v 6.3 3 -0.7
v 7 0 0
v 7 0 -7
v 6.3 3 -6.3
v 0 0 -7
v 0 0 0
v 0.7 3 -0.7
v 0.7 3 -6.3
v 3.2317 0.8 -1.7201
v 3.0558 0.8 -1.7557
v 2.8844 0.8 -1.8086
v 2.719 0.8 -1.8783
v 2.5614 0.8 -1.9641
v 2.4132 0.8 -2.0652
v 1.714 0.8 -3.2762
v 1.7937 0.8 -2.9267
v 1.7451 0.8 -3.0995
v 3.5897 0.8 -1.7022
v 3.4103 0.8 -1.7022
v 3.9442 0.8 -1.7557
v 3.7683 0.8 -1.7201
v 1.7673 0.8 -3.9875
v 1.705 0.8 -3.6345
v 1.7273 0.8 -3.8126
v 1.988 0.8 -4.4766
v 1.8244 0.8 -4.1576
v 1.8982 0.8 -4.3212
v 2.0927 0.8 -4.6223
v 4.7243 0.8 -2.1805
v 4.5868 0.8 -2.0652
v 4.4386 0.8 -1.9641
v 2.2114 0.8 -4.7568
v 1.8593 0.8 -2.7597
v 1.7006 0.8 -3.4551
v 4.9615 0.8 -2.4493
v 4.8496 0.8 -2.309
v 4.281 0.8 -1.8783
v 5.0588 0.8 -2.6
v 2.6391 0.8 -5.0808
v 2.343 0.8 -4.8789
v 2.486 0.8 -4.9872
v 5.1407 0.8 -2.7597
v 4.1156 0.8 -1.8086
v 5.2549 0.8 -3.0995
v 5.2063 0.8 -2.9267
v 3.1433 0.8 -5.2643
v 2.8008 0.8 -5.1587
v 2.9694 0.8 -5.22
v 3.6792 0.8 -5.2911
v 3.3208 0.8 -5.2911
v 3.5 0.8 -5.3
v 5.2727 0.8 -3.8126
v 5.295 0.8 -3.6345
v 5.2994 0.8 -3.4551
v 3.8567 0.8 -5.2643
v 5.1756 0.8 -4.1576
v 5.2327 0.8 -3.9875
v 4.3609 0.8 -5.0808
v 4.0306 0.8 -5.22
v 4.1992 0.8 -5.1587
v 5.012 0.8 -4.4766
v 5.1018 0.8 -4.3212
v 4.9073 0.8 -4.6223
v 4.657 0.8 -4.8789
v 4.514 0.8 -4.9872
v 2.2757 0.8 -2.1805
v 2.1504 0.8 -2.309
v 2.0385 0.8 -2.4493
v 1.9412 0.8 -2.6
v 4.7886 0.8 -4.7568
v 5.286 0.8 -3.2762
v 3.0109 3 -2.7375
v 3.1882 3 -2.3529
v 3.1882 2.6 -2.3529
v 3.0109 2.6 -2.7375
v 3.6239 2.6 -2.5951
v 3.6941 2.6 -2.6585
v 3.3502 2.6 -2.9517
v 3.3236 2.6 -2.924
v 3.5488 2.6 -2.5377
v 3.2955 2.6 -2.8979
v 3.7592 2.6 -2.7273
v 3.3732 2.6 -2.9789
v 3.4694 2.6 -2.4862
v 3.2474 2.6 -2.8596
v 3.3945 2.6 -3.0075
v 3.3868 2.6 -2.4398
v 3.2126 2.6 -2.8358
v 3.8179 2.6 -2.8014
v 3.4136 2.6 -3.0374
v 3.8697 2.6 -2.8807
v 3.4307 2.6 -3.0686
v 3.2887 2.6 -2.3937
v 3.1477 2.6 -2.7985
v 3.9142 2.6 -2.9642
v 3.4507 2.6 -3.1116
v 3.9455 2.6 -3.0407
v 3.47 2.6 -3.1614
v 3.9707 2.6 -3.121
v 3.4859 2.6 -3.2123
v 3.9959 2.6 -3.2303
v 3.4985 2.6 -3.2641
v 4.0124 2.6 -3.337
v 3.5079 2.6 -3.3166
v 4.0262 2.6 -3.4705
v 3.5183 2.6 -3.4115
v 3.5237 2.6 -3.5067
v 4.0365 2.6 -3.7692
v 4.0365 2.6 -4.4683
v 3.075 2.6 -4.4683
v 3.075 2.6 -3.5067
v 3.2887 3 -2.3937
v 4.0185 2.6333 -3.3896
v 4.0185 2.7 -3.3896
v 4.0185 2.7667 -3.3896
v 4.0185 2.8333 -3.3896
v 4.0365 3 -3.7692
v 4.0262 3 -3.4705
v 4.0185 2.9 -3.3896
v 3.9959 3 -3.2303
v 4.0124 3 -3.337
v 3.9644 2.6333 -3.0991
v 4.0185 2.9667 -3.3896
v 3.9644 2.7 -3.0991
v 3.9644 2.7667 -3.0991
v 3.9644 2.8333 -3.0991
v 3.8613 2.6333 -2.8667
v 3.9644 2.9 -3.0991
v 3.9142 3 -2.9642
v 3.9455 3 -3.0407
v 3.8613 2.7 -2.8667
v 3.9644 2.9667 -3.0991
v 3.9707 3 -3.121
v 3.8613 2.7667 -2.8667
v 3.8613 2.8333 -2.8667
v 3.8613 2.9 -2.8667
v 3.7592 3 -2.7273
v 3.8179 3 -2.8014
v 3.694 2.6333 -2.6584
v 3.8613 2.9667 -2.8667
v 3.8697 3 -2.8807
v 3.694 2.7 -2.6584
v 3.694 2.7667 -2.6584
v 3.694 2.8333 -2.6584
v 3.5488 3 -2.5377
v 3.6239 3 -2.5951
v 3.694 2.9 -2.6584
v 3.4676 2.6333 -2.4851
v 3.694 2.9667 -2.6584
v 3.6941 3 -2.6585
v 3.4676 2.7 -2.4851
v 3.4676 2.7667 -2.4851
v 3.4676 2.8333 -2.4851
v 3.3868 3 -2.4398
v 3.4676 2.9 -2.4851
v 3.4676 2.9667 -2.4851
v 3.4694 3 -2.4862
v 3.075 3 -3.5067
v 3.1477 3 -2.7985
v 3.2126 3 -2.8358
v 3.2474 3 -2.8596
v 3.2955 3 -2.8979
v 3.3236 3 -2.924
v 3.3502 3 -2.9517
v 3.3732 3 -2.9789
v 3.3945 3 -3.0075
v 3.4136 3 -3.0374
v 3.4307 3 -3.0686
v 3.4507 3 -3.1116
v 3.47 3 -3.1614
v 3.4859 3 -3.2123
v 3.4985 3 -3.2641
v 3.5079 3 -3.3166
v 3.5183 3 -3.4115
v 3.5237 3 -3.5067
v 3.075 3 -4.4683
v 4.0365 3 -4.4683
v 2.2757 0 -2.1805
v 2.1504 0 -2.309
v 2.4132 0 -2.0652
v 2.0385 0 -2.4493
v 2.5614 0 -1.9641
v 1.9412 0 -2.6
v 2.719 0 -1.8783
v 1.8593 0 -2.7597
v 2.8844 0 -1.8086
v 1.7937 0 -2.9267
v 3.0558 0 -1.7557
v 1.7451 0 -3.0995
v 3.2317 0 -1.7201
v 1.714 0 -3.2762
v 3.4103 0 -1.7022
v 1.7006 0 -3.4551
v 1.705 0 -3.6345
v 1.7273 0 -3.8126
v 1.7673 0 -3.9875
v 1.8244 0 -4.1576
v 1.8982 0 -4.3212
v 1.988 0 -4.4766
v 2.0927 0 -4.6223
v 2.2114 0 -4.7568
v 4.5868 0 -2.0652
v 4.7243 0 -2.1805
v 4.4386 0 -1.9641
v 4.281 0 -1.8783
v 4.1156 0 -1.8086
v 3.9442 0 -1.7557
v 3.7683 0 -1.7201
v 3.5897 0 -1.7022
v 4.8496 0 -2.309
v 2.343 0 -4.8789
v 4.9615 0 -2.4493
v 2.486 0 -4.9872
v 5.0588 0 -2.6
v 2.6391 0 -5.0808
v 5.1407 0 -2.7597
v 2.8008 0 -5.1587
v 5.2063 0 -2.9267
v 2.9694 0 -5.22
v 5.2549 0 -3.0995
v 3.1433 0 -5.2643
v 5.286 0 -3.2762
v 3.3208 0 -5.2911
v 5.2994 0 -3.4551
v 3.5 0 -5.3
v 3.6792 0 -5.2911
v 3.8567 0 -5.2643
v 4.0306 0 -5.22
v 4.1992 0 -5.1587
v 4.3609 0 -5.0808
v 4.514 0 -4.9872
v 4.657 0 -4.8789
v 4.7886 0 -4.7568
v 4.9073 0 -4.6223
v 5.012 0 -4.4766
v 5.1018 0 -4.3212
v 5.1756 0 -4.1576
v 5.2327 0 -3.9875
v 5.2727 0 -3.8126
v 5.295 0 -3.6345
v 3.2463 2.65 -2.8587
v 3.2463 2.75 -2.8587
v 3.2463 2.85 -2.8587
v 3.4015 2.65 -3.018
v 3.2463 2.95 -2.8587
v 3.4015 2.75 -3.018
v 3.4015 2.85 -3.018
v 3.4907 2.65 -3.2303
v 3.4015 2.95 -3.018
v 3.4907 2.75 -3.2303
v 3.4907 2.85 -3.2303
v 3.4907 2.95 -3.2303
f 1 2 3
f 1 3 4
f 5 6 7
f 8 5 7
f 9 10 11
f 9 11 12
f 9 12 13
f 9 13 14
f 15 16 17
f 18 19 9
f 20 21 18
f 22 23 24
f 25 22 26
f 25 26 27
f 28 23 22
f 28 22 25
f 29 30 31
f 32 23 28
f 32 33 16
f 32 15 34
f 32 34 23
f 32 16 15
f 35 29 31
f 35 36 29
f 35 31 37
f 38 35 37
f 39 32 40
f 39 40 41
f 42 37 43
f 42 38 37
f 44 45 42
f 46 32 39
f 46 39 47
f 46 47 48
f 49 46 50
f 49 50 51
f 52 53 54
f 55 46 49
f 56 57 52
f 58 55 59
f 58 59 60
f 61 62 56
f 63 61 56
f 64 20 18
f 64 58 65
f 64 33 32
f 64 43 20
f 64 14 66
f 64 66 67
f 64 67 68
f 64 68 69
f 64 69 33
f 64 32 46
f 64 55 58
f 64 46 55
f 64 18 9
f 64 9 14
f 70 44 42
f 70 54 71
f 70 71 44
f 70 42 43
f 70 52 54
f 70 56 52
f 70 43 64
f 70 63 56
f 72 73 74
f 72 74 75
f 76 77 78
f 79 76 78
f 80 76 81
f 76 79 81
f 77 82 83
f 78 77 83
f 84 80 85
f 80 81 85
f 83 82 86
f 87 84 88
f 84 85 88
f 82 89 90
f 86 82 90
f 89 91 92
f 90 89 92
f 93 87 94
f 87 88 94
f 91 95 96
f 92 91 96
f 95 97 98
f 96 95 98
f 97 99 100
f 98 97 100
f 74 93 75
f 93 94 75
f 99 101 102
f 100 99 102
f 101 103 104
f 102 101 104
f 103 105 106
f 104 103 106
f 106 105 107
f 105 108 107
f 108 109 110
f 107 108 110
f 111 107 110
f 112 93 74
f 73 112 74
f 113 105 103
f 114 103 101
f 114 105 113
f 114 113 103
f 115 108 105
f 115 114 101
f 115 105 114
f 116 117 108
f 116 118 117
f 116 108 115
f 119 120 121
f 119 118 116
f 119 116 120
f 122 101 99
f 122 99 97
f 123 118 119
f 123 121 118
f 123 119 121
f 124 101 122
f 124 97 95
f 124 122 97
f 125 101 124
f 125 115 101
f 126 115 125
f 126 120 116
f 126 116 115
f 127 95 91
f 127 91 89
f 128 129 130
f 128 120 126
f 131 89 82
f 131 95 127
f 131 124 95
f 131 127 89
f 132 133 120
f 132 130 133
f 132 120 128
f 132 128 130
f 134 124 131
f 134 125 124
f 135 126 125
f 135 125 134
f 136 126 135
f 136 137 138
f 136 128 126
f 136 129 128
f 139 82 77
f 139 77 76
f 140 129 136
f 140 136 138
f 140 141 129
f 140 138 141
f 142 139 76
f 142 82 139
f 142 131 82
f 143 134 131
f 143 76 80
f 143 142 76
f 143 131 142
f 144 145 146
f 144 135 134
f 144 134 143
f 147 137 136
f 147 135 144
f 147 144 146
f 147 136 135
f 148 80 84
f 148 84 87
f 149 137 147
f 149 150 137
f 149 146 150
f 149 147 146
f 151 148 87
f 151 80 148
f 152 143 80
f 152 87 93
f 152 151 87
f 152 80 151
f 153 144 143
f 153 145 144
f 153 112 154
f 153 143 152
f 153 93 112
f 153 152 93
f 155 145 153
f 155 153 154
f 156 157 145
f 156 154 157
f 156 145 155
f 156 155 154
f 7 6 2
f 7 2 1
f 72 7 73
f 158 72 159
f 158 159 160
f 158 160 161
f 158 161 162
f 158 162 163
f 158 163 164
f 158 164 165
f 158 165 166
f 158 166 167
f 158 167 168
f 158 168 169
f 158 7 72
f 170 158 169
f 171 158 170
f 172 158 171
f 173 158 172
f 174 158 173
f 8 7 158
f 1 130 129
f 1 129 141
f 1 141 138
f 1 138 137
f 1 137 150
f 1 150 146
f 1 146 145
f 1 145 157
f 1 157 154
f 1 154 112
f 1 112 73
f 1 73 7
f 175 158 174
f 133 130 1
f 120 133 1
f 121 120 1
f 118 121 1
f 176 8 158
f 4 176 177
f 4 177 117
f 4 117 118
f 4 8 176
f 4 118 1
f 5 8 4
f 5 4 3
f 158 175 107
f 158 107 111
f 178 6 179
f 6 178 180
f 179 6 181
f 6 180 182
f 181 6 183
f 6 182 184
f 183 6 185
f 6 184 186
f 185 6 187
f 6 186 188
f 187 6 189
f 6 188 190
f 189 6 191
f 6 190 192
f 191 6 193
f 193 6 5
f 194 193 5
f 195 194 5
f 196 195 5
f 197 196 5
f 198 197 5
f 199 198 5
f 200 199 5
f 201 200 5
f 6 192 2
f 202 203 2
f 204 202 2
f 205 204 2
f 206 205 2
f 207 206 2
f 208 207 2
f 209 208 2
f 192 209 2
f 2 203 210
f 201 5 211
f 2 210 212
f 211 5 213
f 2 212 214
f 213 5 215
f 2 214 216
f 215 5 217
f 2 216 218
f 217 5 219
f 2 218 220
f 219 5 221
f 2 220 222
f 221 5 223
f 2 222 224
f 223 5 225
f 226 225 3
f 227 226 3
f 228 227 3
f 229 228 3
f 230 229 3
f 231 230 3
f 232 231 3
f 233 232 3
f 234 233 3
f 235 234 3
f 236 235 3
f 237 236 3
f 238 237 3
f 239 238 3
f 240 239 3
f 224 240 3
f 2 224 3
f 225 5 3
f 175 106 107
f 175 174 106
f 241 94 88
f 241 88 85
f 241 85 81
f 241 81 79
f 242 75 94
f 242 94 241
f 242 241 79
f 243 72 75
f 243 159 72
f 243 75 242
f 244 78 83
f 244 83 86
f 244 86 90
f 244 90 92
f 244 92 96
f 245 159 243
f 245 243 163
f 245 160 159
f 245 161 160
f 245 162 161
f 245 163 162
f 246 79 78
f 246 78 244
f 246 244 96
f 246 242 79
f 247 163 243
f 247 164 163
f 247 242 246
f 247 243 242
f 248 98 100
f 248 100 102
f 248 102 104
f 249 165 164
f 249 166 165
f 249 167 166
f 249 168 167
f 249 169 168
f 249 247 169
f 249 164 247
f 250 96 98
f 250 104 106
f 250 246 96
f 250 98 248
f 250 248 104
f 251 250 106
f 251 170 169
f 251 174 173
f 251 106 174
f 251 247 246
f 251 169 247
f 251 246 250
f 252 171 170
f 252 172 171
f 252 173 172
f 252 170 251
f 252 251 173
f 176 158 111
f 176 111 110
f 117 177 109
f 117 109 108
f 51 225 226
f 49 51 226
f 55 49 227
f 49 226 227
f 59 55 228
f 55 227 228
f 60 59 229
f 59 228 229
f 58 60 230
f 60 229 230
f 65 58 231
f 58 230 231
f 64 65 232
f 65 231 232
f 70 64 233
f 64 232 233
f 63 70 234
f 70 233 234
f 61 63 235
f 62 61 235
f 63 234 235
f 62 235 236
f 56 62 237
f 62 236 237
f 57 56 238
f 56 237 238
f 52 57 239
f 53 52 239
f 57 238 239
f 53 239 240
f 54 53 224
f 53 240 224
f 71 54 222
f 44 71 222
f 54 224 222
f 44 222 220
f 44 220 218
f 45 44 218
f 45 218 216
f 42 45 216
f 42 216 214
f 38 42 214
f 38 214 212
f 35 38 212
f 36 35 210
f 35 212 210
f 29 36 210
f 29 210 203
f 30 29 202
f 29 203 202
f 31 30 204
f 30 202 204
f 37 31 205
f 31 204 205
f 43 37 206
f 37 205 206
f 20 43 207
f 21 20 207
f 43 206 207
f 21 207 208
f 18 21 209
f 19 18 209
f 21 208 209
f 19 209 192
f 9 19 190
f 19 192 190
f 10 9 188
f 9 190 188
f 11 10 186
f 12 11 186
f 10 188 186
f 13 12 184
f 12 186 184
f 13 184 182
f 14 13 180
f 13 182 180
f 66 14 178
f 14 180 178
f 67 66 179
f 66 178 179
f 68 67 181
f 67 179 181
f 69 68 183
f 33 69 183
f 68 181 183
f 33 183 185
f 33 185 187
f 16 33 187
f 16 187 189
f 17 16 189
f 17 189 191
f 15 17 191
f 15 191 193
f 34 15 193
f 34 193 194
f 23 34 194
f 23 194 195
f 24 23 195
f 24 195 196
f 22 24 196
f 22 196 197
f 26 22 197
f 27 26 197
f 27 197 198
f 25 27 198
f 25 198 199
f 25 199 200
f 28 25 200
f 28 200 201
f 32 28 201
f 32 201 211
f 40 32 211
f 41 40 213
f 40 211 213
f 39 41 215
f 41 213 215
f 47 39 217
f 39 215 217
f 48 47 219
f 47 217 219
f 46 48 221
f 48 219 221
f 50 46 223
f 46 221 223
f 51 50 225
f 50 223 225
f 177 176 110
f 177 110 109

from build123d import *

# Parameters (mm, degrees)
SKETCH1_W           = 7
SKETCH1_H           = 7
BOSS_EXTRUDE1_DEPTH = 3
CUT_EXTRUDE1_DEPTH  = 7
CUT_EXTRUDE2_DEPTH  = 11
SKETCH4_R           = 1.8
CUT_EXTRUDE3_DEPTH  = 0.8
CUT_EXTRUDE4_DEPTH  = 0.4


with BuildPart() as part:
    # Sketch1 → Boss-Extrude1 (new body)
    with BuildSketch(Plane(origin=(0, 0, 0), x_dir=(1, 0, 0), z_dir=(0, 1, 0))):
        with Locations((3.5, 3.5)):
            Rectangle(SKETCH1_W, SKETCH1_H)
    extrude(amount=BOSS_EXTRUDE1_DEPTH)

    # Sketch2 → Cut-Extrude1 (cut)
    with BuildSketch(Plane.XY):
        Polygon((0, 0), (0.7, 3), (0, 3), align=None)
        Polygon((7, 0), (6.3, 3), (7, 3), align=None)
    extrude(amount=-CUT_EXTRUDE1_DEPTH, mode=Mode.SUBTRACT)

    # Sketch3 → Cut-Extrude2 (cut)
    with BuildSketch(Plane(origin=(0, 0, 0), x_dir=(0, 0, -1), z_dir=(1, 0, 0))):
        Polygon((0, 0), (0.7, 3), (0, 3), align=None)
        Polygon((7, 3), (6.3, 3), (7, 0), align=None)
    extrude(amount=CUT_EXTRUDE2_DEPTH, mode=Mode.SUBTRACT)

    # Sketch4 → Cut-Extrude3 (cut)
    with BuildSketch(Plane.XZ):
        with Locations(Location((3.5, -3.5, 0), (0, 0, 270))):
            Circle(SKETCH4_R)
    extrude(amount=-CUT_EXTRUDE3_DEPTH, mode=Mode.SUBTRACT)

    # Sketch5 → Cut-Extrude4 (cut)
    with BuildSketch(Plane(origin=(0, 3, 0), x_dir=(1, 0, 0), z_dir=(0, 1, 0))):
        with BuildLine():
            Line((3.074992012, 4.468285429), (4.036530474, 4.468285429))
            Line((4.036530474, 4.468285429), (4.036530474, 3.769166839))
            add(Edge.make_bspline(
                [(4.036530474, 3.769166839), (4.036086851, 3.702022613), (4.035249234, 3.575245505), (4.020566764, 3.39640898), (4.000165605, 3.239359877), (3.967710391, 3.102079519), (3.924256019, 2.978103986), (3.862818552, 2.864662172), (3.787262222, 2.756102323), (3.694844376, 2.655709349), (3.588530384, 2.562855929), (3.467088334, 2.482109847), (3.333400229, 2.410169074), (3.237355705, 2.372295276), (3.188173102, 2.352900814)],
                knots=[0, 0, 0, 0, 1.347156832, 2.543608823, 3.599300285, 4.522475688, 5.370350604, 6.227678973, 7.103274953, 8.018757603, 8.959280198, 9.929437417, 10.939703653, 12, 12, 12, 12], degree=3))
            Line((3.188173102, 2.352900814), (3.010889448, 2.737516198))
            add(Edge.make_bspline(
                [(3.010889448, 2.737516198), (3.053777828, 2.755154018), (3.135615846, 2.78880985), (3.245316967, 2.853643094), (3.334062536, 2.929935998), (3.405416723, 3.016399576), (3.45643151, 3.118107137), (3.494770079, 3.233341119), (3.516994248, 3.365049182), (3.521395894, 3.457921451), (3.523709961, 3.506746968)],
                knots=[0, 0, 0, 0, 1.113959817, 2.125616841, 3.047494432, 3.914868512, 4.801521967, 5.765947312, 6.825496818, 8, 8, 8, 8], degree=3))
            Line((3.523709961, 3.506746968), (3.074992012, 3.506746968))
            Line((3.074992012, 3.506746968), (3.074992012, 4.468285429))
        make_face()
    extrude(amount=-CUT_EXTRUDE4_DEPTH, mode=Mode.SUBTRACT)


solid = part.part
